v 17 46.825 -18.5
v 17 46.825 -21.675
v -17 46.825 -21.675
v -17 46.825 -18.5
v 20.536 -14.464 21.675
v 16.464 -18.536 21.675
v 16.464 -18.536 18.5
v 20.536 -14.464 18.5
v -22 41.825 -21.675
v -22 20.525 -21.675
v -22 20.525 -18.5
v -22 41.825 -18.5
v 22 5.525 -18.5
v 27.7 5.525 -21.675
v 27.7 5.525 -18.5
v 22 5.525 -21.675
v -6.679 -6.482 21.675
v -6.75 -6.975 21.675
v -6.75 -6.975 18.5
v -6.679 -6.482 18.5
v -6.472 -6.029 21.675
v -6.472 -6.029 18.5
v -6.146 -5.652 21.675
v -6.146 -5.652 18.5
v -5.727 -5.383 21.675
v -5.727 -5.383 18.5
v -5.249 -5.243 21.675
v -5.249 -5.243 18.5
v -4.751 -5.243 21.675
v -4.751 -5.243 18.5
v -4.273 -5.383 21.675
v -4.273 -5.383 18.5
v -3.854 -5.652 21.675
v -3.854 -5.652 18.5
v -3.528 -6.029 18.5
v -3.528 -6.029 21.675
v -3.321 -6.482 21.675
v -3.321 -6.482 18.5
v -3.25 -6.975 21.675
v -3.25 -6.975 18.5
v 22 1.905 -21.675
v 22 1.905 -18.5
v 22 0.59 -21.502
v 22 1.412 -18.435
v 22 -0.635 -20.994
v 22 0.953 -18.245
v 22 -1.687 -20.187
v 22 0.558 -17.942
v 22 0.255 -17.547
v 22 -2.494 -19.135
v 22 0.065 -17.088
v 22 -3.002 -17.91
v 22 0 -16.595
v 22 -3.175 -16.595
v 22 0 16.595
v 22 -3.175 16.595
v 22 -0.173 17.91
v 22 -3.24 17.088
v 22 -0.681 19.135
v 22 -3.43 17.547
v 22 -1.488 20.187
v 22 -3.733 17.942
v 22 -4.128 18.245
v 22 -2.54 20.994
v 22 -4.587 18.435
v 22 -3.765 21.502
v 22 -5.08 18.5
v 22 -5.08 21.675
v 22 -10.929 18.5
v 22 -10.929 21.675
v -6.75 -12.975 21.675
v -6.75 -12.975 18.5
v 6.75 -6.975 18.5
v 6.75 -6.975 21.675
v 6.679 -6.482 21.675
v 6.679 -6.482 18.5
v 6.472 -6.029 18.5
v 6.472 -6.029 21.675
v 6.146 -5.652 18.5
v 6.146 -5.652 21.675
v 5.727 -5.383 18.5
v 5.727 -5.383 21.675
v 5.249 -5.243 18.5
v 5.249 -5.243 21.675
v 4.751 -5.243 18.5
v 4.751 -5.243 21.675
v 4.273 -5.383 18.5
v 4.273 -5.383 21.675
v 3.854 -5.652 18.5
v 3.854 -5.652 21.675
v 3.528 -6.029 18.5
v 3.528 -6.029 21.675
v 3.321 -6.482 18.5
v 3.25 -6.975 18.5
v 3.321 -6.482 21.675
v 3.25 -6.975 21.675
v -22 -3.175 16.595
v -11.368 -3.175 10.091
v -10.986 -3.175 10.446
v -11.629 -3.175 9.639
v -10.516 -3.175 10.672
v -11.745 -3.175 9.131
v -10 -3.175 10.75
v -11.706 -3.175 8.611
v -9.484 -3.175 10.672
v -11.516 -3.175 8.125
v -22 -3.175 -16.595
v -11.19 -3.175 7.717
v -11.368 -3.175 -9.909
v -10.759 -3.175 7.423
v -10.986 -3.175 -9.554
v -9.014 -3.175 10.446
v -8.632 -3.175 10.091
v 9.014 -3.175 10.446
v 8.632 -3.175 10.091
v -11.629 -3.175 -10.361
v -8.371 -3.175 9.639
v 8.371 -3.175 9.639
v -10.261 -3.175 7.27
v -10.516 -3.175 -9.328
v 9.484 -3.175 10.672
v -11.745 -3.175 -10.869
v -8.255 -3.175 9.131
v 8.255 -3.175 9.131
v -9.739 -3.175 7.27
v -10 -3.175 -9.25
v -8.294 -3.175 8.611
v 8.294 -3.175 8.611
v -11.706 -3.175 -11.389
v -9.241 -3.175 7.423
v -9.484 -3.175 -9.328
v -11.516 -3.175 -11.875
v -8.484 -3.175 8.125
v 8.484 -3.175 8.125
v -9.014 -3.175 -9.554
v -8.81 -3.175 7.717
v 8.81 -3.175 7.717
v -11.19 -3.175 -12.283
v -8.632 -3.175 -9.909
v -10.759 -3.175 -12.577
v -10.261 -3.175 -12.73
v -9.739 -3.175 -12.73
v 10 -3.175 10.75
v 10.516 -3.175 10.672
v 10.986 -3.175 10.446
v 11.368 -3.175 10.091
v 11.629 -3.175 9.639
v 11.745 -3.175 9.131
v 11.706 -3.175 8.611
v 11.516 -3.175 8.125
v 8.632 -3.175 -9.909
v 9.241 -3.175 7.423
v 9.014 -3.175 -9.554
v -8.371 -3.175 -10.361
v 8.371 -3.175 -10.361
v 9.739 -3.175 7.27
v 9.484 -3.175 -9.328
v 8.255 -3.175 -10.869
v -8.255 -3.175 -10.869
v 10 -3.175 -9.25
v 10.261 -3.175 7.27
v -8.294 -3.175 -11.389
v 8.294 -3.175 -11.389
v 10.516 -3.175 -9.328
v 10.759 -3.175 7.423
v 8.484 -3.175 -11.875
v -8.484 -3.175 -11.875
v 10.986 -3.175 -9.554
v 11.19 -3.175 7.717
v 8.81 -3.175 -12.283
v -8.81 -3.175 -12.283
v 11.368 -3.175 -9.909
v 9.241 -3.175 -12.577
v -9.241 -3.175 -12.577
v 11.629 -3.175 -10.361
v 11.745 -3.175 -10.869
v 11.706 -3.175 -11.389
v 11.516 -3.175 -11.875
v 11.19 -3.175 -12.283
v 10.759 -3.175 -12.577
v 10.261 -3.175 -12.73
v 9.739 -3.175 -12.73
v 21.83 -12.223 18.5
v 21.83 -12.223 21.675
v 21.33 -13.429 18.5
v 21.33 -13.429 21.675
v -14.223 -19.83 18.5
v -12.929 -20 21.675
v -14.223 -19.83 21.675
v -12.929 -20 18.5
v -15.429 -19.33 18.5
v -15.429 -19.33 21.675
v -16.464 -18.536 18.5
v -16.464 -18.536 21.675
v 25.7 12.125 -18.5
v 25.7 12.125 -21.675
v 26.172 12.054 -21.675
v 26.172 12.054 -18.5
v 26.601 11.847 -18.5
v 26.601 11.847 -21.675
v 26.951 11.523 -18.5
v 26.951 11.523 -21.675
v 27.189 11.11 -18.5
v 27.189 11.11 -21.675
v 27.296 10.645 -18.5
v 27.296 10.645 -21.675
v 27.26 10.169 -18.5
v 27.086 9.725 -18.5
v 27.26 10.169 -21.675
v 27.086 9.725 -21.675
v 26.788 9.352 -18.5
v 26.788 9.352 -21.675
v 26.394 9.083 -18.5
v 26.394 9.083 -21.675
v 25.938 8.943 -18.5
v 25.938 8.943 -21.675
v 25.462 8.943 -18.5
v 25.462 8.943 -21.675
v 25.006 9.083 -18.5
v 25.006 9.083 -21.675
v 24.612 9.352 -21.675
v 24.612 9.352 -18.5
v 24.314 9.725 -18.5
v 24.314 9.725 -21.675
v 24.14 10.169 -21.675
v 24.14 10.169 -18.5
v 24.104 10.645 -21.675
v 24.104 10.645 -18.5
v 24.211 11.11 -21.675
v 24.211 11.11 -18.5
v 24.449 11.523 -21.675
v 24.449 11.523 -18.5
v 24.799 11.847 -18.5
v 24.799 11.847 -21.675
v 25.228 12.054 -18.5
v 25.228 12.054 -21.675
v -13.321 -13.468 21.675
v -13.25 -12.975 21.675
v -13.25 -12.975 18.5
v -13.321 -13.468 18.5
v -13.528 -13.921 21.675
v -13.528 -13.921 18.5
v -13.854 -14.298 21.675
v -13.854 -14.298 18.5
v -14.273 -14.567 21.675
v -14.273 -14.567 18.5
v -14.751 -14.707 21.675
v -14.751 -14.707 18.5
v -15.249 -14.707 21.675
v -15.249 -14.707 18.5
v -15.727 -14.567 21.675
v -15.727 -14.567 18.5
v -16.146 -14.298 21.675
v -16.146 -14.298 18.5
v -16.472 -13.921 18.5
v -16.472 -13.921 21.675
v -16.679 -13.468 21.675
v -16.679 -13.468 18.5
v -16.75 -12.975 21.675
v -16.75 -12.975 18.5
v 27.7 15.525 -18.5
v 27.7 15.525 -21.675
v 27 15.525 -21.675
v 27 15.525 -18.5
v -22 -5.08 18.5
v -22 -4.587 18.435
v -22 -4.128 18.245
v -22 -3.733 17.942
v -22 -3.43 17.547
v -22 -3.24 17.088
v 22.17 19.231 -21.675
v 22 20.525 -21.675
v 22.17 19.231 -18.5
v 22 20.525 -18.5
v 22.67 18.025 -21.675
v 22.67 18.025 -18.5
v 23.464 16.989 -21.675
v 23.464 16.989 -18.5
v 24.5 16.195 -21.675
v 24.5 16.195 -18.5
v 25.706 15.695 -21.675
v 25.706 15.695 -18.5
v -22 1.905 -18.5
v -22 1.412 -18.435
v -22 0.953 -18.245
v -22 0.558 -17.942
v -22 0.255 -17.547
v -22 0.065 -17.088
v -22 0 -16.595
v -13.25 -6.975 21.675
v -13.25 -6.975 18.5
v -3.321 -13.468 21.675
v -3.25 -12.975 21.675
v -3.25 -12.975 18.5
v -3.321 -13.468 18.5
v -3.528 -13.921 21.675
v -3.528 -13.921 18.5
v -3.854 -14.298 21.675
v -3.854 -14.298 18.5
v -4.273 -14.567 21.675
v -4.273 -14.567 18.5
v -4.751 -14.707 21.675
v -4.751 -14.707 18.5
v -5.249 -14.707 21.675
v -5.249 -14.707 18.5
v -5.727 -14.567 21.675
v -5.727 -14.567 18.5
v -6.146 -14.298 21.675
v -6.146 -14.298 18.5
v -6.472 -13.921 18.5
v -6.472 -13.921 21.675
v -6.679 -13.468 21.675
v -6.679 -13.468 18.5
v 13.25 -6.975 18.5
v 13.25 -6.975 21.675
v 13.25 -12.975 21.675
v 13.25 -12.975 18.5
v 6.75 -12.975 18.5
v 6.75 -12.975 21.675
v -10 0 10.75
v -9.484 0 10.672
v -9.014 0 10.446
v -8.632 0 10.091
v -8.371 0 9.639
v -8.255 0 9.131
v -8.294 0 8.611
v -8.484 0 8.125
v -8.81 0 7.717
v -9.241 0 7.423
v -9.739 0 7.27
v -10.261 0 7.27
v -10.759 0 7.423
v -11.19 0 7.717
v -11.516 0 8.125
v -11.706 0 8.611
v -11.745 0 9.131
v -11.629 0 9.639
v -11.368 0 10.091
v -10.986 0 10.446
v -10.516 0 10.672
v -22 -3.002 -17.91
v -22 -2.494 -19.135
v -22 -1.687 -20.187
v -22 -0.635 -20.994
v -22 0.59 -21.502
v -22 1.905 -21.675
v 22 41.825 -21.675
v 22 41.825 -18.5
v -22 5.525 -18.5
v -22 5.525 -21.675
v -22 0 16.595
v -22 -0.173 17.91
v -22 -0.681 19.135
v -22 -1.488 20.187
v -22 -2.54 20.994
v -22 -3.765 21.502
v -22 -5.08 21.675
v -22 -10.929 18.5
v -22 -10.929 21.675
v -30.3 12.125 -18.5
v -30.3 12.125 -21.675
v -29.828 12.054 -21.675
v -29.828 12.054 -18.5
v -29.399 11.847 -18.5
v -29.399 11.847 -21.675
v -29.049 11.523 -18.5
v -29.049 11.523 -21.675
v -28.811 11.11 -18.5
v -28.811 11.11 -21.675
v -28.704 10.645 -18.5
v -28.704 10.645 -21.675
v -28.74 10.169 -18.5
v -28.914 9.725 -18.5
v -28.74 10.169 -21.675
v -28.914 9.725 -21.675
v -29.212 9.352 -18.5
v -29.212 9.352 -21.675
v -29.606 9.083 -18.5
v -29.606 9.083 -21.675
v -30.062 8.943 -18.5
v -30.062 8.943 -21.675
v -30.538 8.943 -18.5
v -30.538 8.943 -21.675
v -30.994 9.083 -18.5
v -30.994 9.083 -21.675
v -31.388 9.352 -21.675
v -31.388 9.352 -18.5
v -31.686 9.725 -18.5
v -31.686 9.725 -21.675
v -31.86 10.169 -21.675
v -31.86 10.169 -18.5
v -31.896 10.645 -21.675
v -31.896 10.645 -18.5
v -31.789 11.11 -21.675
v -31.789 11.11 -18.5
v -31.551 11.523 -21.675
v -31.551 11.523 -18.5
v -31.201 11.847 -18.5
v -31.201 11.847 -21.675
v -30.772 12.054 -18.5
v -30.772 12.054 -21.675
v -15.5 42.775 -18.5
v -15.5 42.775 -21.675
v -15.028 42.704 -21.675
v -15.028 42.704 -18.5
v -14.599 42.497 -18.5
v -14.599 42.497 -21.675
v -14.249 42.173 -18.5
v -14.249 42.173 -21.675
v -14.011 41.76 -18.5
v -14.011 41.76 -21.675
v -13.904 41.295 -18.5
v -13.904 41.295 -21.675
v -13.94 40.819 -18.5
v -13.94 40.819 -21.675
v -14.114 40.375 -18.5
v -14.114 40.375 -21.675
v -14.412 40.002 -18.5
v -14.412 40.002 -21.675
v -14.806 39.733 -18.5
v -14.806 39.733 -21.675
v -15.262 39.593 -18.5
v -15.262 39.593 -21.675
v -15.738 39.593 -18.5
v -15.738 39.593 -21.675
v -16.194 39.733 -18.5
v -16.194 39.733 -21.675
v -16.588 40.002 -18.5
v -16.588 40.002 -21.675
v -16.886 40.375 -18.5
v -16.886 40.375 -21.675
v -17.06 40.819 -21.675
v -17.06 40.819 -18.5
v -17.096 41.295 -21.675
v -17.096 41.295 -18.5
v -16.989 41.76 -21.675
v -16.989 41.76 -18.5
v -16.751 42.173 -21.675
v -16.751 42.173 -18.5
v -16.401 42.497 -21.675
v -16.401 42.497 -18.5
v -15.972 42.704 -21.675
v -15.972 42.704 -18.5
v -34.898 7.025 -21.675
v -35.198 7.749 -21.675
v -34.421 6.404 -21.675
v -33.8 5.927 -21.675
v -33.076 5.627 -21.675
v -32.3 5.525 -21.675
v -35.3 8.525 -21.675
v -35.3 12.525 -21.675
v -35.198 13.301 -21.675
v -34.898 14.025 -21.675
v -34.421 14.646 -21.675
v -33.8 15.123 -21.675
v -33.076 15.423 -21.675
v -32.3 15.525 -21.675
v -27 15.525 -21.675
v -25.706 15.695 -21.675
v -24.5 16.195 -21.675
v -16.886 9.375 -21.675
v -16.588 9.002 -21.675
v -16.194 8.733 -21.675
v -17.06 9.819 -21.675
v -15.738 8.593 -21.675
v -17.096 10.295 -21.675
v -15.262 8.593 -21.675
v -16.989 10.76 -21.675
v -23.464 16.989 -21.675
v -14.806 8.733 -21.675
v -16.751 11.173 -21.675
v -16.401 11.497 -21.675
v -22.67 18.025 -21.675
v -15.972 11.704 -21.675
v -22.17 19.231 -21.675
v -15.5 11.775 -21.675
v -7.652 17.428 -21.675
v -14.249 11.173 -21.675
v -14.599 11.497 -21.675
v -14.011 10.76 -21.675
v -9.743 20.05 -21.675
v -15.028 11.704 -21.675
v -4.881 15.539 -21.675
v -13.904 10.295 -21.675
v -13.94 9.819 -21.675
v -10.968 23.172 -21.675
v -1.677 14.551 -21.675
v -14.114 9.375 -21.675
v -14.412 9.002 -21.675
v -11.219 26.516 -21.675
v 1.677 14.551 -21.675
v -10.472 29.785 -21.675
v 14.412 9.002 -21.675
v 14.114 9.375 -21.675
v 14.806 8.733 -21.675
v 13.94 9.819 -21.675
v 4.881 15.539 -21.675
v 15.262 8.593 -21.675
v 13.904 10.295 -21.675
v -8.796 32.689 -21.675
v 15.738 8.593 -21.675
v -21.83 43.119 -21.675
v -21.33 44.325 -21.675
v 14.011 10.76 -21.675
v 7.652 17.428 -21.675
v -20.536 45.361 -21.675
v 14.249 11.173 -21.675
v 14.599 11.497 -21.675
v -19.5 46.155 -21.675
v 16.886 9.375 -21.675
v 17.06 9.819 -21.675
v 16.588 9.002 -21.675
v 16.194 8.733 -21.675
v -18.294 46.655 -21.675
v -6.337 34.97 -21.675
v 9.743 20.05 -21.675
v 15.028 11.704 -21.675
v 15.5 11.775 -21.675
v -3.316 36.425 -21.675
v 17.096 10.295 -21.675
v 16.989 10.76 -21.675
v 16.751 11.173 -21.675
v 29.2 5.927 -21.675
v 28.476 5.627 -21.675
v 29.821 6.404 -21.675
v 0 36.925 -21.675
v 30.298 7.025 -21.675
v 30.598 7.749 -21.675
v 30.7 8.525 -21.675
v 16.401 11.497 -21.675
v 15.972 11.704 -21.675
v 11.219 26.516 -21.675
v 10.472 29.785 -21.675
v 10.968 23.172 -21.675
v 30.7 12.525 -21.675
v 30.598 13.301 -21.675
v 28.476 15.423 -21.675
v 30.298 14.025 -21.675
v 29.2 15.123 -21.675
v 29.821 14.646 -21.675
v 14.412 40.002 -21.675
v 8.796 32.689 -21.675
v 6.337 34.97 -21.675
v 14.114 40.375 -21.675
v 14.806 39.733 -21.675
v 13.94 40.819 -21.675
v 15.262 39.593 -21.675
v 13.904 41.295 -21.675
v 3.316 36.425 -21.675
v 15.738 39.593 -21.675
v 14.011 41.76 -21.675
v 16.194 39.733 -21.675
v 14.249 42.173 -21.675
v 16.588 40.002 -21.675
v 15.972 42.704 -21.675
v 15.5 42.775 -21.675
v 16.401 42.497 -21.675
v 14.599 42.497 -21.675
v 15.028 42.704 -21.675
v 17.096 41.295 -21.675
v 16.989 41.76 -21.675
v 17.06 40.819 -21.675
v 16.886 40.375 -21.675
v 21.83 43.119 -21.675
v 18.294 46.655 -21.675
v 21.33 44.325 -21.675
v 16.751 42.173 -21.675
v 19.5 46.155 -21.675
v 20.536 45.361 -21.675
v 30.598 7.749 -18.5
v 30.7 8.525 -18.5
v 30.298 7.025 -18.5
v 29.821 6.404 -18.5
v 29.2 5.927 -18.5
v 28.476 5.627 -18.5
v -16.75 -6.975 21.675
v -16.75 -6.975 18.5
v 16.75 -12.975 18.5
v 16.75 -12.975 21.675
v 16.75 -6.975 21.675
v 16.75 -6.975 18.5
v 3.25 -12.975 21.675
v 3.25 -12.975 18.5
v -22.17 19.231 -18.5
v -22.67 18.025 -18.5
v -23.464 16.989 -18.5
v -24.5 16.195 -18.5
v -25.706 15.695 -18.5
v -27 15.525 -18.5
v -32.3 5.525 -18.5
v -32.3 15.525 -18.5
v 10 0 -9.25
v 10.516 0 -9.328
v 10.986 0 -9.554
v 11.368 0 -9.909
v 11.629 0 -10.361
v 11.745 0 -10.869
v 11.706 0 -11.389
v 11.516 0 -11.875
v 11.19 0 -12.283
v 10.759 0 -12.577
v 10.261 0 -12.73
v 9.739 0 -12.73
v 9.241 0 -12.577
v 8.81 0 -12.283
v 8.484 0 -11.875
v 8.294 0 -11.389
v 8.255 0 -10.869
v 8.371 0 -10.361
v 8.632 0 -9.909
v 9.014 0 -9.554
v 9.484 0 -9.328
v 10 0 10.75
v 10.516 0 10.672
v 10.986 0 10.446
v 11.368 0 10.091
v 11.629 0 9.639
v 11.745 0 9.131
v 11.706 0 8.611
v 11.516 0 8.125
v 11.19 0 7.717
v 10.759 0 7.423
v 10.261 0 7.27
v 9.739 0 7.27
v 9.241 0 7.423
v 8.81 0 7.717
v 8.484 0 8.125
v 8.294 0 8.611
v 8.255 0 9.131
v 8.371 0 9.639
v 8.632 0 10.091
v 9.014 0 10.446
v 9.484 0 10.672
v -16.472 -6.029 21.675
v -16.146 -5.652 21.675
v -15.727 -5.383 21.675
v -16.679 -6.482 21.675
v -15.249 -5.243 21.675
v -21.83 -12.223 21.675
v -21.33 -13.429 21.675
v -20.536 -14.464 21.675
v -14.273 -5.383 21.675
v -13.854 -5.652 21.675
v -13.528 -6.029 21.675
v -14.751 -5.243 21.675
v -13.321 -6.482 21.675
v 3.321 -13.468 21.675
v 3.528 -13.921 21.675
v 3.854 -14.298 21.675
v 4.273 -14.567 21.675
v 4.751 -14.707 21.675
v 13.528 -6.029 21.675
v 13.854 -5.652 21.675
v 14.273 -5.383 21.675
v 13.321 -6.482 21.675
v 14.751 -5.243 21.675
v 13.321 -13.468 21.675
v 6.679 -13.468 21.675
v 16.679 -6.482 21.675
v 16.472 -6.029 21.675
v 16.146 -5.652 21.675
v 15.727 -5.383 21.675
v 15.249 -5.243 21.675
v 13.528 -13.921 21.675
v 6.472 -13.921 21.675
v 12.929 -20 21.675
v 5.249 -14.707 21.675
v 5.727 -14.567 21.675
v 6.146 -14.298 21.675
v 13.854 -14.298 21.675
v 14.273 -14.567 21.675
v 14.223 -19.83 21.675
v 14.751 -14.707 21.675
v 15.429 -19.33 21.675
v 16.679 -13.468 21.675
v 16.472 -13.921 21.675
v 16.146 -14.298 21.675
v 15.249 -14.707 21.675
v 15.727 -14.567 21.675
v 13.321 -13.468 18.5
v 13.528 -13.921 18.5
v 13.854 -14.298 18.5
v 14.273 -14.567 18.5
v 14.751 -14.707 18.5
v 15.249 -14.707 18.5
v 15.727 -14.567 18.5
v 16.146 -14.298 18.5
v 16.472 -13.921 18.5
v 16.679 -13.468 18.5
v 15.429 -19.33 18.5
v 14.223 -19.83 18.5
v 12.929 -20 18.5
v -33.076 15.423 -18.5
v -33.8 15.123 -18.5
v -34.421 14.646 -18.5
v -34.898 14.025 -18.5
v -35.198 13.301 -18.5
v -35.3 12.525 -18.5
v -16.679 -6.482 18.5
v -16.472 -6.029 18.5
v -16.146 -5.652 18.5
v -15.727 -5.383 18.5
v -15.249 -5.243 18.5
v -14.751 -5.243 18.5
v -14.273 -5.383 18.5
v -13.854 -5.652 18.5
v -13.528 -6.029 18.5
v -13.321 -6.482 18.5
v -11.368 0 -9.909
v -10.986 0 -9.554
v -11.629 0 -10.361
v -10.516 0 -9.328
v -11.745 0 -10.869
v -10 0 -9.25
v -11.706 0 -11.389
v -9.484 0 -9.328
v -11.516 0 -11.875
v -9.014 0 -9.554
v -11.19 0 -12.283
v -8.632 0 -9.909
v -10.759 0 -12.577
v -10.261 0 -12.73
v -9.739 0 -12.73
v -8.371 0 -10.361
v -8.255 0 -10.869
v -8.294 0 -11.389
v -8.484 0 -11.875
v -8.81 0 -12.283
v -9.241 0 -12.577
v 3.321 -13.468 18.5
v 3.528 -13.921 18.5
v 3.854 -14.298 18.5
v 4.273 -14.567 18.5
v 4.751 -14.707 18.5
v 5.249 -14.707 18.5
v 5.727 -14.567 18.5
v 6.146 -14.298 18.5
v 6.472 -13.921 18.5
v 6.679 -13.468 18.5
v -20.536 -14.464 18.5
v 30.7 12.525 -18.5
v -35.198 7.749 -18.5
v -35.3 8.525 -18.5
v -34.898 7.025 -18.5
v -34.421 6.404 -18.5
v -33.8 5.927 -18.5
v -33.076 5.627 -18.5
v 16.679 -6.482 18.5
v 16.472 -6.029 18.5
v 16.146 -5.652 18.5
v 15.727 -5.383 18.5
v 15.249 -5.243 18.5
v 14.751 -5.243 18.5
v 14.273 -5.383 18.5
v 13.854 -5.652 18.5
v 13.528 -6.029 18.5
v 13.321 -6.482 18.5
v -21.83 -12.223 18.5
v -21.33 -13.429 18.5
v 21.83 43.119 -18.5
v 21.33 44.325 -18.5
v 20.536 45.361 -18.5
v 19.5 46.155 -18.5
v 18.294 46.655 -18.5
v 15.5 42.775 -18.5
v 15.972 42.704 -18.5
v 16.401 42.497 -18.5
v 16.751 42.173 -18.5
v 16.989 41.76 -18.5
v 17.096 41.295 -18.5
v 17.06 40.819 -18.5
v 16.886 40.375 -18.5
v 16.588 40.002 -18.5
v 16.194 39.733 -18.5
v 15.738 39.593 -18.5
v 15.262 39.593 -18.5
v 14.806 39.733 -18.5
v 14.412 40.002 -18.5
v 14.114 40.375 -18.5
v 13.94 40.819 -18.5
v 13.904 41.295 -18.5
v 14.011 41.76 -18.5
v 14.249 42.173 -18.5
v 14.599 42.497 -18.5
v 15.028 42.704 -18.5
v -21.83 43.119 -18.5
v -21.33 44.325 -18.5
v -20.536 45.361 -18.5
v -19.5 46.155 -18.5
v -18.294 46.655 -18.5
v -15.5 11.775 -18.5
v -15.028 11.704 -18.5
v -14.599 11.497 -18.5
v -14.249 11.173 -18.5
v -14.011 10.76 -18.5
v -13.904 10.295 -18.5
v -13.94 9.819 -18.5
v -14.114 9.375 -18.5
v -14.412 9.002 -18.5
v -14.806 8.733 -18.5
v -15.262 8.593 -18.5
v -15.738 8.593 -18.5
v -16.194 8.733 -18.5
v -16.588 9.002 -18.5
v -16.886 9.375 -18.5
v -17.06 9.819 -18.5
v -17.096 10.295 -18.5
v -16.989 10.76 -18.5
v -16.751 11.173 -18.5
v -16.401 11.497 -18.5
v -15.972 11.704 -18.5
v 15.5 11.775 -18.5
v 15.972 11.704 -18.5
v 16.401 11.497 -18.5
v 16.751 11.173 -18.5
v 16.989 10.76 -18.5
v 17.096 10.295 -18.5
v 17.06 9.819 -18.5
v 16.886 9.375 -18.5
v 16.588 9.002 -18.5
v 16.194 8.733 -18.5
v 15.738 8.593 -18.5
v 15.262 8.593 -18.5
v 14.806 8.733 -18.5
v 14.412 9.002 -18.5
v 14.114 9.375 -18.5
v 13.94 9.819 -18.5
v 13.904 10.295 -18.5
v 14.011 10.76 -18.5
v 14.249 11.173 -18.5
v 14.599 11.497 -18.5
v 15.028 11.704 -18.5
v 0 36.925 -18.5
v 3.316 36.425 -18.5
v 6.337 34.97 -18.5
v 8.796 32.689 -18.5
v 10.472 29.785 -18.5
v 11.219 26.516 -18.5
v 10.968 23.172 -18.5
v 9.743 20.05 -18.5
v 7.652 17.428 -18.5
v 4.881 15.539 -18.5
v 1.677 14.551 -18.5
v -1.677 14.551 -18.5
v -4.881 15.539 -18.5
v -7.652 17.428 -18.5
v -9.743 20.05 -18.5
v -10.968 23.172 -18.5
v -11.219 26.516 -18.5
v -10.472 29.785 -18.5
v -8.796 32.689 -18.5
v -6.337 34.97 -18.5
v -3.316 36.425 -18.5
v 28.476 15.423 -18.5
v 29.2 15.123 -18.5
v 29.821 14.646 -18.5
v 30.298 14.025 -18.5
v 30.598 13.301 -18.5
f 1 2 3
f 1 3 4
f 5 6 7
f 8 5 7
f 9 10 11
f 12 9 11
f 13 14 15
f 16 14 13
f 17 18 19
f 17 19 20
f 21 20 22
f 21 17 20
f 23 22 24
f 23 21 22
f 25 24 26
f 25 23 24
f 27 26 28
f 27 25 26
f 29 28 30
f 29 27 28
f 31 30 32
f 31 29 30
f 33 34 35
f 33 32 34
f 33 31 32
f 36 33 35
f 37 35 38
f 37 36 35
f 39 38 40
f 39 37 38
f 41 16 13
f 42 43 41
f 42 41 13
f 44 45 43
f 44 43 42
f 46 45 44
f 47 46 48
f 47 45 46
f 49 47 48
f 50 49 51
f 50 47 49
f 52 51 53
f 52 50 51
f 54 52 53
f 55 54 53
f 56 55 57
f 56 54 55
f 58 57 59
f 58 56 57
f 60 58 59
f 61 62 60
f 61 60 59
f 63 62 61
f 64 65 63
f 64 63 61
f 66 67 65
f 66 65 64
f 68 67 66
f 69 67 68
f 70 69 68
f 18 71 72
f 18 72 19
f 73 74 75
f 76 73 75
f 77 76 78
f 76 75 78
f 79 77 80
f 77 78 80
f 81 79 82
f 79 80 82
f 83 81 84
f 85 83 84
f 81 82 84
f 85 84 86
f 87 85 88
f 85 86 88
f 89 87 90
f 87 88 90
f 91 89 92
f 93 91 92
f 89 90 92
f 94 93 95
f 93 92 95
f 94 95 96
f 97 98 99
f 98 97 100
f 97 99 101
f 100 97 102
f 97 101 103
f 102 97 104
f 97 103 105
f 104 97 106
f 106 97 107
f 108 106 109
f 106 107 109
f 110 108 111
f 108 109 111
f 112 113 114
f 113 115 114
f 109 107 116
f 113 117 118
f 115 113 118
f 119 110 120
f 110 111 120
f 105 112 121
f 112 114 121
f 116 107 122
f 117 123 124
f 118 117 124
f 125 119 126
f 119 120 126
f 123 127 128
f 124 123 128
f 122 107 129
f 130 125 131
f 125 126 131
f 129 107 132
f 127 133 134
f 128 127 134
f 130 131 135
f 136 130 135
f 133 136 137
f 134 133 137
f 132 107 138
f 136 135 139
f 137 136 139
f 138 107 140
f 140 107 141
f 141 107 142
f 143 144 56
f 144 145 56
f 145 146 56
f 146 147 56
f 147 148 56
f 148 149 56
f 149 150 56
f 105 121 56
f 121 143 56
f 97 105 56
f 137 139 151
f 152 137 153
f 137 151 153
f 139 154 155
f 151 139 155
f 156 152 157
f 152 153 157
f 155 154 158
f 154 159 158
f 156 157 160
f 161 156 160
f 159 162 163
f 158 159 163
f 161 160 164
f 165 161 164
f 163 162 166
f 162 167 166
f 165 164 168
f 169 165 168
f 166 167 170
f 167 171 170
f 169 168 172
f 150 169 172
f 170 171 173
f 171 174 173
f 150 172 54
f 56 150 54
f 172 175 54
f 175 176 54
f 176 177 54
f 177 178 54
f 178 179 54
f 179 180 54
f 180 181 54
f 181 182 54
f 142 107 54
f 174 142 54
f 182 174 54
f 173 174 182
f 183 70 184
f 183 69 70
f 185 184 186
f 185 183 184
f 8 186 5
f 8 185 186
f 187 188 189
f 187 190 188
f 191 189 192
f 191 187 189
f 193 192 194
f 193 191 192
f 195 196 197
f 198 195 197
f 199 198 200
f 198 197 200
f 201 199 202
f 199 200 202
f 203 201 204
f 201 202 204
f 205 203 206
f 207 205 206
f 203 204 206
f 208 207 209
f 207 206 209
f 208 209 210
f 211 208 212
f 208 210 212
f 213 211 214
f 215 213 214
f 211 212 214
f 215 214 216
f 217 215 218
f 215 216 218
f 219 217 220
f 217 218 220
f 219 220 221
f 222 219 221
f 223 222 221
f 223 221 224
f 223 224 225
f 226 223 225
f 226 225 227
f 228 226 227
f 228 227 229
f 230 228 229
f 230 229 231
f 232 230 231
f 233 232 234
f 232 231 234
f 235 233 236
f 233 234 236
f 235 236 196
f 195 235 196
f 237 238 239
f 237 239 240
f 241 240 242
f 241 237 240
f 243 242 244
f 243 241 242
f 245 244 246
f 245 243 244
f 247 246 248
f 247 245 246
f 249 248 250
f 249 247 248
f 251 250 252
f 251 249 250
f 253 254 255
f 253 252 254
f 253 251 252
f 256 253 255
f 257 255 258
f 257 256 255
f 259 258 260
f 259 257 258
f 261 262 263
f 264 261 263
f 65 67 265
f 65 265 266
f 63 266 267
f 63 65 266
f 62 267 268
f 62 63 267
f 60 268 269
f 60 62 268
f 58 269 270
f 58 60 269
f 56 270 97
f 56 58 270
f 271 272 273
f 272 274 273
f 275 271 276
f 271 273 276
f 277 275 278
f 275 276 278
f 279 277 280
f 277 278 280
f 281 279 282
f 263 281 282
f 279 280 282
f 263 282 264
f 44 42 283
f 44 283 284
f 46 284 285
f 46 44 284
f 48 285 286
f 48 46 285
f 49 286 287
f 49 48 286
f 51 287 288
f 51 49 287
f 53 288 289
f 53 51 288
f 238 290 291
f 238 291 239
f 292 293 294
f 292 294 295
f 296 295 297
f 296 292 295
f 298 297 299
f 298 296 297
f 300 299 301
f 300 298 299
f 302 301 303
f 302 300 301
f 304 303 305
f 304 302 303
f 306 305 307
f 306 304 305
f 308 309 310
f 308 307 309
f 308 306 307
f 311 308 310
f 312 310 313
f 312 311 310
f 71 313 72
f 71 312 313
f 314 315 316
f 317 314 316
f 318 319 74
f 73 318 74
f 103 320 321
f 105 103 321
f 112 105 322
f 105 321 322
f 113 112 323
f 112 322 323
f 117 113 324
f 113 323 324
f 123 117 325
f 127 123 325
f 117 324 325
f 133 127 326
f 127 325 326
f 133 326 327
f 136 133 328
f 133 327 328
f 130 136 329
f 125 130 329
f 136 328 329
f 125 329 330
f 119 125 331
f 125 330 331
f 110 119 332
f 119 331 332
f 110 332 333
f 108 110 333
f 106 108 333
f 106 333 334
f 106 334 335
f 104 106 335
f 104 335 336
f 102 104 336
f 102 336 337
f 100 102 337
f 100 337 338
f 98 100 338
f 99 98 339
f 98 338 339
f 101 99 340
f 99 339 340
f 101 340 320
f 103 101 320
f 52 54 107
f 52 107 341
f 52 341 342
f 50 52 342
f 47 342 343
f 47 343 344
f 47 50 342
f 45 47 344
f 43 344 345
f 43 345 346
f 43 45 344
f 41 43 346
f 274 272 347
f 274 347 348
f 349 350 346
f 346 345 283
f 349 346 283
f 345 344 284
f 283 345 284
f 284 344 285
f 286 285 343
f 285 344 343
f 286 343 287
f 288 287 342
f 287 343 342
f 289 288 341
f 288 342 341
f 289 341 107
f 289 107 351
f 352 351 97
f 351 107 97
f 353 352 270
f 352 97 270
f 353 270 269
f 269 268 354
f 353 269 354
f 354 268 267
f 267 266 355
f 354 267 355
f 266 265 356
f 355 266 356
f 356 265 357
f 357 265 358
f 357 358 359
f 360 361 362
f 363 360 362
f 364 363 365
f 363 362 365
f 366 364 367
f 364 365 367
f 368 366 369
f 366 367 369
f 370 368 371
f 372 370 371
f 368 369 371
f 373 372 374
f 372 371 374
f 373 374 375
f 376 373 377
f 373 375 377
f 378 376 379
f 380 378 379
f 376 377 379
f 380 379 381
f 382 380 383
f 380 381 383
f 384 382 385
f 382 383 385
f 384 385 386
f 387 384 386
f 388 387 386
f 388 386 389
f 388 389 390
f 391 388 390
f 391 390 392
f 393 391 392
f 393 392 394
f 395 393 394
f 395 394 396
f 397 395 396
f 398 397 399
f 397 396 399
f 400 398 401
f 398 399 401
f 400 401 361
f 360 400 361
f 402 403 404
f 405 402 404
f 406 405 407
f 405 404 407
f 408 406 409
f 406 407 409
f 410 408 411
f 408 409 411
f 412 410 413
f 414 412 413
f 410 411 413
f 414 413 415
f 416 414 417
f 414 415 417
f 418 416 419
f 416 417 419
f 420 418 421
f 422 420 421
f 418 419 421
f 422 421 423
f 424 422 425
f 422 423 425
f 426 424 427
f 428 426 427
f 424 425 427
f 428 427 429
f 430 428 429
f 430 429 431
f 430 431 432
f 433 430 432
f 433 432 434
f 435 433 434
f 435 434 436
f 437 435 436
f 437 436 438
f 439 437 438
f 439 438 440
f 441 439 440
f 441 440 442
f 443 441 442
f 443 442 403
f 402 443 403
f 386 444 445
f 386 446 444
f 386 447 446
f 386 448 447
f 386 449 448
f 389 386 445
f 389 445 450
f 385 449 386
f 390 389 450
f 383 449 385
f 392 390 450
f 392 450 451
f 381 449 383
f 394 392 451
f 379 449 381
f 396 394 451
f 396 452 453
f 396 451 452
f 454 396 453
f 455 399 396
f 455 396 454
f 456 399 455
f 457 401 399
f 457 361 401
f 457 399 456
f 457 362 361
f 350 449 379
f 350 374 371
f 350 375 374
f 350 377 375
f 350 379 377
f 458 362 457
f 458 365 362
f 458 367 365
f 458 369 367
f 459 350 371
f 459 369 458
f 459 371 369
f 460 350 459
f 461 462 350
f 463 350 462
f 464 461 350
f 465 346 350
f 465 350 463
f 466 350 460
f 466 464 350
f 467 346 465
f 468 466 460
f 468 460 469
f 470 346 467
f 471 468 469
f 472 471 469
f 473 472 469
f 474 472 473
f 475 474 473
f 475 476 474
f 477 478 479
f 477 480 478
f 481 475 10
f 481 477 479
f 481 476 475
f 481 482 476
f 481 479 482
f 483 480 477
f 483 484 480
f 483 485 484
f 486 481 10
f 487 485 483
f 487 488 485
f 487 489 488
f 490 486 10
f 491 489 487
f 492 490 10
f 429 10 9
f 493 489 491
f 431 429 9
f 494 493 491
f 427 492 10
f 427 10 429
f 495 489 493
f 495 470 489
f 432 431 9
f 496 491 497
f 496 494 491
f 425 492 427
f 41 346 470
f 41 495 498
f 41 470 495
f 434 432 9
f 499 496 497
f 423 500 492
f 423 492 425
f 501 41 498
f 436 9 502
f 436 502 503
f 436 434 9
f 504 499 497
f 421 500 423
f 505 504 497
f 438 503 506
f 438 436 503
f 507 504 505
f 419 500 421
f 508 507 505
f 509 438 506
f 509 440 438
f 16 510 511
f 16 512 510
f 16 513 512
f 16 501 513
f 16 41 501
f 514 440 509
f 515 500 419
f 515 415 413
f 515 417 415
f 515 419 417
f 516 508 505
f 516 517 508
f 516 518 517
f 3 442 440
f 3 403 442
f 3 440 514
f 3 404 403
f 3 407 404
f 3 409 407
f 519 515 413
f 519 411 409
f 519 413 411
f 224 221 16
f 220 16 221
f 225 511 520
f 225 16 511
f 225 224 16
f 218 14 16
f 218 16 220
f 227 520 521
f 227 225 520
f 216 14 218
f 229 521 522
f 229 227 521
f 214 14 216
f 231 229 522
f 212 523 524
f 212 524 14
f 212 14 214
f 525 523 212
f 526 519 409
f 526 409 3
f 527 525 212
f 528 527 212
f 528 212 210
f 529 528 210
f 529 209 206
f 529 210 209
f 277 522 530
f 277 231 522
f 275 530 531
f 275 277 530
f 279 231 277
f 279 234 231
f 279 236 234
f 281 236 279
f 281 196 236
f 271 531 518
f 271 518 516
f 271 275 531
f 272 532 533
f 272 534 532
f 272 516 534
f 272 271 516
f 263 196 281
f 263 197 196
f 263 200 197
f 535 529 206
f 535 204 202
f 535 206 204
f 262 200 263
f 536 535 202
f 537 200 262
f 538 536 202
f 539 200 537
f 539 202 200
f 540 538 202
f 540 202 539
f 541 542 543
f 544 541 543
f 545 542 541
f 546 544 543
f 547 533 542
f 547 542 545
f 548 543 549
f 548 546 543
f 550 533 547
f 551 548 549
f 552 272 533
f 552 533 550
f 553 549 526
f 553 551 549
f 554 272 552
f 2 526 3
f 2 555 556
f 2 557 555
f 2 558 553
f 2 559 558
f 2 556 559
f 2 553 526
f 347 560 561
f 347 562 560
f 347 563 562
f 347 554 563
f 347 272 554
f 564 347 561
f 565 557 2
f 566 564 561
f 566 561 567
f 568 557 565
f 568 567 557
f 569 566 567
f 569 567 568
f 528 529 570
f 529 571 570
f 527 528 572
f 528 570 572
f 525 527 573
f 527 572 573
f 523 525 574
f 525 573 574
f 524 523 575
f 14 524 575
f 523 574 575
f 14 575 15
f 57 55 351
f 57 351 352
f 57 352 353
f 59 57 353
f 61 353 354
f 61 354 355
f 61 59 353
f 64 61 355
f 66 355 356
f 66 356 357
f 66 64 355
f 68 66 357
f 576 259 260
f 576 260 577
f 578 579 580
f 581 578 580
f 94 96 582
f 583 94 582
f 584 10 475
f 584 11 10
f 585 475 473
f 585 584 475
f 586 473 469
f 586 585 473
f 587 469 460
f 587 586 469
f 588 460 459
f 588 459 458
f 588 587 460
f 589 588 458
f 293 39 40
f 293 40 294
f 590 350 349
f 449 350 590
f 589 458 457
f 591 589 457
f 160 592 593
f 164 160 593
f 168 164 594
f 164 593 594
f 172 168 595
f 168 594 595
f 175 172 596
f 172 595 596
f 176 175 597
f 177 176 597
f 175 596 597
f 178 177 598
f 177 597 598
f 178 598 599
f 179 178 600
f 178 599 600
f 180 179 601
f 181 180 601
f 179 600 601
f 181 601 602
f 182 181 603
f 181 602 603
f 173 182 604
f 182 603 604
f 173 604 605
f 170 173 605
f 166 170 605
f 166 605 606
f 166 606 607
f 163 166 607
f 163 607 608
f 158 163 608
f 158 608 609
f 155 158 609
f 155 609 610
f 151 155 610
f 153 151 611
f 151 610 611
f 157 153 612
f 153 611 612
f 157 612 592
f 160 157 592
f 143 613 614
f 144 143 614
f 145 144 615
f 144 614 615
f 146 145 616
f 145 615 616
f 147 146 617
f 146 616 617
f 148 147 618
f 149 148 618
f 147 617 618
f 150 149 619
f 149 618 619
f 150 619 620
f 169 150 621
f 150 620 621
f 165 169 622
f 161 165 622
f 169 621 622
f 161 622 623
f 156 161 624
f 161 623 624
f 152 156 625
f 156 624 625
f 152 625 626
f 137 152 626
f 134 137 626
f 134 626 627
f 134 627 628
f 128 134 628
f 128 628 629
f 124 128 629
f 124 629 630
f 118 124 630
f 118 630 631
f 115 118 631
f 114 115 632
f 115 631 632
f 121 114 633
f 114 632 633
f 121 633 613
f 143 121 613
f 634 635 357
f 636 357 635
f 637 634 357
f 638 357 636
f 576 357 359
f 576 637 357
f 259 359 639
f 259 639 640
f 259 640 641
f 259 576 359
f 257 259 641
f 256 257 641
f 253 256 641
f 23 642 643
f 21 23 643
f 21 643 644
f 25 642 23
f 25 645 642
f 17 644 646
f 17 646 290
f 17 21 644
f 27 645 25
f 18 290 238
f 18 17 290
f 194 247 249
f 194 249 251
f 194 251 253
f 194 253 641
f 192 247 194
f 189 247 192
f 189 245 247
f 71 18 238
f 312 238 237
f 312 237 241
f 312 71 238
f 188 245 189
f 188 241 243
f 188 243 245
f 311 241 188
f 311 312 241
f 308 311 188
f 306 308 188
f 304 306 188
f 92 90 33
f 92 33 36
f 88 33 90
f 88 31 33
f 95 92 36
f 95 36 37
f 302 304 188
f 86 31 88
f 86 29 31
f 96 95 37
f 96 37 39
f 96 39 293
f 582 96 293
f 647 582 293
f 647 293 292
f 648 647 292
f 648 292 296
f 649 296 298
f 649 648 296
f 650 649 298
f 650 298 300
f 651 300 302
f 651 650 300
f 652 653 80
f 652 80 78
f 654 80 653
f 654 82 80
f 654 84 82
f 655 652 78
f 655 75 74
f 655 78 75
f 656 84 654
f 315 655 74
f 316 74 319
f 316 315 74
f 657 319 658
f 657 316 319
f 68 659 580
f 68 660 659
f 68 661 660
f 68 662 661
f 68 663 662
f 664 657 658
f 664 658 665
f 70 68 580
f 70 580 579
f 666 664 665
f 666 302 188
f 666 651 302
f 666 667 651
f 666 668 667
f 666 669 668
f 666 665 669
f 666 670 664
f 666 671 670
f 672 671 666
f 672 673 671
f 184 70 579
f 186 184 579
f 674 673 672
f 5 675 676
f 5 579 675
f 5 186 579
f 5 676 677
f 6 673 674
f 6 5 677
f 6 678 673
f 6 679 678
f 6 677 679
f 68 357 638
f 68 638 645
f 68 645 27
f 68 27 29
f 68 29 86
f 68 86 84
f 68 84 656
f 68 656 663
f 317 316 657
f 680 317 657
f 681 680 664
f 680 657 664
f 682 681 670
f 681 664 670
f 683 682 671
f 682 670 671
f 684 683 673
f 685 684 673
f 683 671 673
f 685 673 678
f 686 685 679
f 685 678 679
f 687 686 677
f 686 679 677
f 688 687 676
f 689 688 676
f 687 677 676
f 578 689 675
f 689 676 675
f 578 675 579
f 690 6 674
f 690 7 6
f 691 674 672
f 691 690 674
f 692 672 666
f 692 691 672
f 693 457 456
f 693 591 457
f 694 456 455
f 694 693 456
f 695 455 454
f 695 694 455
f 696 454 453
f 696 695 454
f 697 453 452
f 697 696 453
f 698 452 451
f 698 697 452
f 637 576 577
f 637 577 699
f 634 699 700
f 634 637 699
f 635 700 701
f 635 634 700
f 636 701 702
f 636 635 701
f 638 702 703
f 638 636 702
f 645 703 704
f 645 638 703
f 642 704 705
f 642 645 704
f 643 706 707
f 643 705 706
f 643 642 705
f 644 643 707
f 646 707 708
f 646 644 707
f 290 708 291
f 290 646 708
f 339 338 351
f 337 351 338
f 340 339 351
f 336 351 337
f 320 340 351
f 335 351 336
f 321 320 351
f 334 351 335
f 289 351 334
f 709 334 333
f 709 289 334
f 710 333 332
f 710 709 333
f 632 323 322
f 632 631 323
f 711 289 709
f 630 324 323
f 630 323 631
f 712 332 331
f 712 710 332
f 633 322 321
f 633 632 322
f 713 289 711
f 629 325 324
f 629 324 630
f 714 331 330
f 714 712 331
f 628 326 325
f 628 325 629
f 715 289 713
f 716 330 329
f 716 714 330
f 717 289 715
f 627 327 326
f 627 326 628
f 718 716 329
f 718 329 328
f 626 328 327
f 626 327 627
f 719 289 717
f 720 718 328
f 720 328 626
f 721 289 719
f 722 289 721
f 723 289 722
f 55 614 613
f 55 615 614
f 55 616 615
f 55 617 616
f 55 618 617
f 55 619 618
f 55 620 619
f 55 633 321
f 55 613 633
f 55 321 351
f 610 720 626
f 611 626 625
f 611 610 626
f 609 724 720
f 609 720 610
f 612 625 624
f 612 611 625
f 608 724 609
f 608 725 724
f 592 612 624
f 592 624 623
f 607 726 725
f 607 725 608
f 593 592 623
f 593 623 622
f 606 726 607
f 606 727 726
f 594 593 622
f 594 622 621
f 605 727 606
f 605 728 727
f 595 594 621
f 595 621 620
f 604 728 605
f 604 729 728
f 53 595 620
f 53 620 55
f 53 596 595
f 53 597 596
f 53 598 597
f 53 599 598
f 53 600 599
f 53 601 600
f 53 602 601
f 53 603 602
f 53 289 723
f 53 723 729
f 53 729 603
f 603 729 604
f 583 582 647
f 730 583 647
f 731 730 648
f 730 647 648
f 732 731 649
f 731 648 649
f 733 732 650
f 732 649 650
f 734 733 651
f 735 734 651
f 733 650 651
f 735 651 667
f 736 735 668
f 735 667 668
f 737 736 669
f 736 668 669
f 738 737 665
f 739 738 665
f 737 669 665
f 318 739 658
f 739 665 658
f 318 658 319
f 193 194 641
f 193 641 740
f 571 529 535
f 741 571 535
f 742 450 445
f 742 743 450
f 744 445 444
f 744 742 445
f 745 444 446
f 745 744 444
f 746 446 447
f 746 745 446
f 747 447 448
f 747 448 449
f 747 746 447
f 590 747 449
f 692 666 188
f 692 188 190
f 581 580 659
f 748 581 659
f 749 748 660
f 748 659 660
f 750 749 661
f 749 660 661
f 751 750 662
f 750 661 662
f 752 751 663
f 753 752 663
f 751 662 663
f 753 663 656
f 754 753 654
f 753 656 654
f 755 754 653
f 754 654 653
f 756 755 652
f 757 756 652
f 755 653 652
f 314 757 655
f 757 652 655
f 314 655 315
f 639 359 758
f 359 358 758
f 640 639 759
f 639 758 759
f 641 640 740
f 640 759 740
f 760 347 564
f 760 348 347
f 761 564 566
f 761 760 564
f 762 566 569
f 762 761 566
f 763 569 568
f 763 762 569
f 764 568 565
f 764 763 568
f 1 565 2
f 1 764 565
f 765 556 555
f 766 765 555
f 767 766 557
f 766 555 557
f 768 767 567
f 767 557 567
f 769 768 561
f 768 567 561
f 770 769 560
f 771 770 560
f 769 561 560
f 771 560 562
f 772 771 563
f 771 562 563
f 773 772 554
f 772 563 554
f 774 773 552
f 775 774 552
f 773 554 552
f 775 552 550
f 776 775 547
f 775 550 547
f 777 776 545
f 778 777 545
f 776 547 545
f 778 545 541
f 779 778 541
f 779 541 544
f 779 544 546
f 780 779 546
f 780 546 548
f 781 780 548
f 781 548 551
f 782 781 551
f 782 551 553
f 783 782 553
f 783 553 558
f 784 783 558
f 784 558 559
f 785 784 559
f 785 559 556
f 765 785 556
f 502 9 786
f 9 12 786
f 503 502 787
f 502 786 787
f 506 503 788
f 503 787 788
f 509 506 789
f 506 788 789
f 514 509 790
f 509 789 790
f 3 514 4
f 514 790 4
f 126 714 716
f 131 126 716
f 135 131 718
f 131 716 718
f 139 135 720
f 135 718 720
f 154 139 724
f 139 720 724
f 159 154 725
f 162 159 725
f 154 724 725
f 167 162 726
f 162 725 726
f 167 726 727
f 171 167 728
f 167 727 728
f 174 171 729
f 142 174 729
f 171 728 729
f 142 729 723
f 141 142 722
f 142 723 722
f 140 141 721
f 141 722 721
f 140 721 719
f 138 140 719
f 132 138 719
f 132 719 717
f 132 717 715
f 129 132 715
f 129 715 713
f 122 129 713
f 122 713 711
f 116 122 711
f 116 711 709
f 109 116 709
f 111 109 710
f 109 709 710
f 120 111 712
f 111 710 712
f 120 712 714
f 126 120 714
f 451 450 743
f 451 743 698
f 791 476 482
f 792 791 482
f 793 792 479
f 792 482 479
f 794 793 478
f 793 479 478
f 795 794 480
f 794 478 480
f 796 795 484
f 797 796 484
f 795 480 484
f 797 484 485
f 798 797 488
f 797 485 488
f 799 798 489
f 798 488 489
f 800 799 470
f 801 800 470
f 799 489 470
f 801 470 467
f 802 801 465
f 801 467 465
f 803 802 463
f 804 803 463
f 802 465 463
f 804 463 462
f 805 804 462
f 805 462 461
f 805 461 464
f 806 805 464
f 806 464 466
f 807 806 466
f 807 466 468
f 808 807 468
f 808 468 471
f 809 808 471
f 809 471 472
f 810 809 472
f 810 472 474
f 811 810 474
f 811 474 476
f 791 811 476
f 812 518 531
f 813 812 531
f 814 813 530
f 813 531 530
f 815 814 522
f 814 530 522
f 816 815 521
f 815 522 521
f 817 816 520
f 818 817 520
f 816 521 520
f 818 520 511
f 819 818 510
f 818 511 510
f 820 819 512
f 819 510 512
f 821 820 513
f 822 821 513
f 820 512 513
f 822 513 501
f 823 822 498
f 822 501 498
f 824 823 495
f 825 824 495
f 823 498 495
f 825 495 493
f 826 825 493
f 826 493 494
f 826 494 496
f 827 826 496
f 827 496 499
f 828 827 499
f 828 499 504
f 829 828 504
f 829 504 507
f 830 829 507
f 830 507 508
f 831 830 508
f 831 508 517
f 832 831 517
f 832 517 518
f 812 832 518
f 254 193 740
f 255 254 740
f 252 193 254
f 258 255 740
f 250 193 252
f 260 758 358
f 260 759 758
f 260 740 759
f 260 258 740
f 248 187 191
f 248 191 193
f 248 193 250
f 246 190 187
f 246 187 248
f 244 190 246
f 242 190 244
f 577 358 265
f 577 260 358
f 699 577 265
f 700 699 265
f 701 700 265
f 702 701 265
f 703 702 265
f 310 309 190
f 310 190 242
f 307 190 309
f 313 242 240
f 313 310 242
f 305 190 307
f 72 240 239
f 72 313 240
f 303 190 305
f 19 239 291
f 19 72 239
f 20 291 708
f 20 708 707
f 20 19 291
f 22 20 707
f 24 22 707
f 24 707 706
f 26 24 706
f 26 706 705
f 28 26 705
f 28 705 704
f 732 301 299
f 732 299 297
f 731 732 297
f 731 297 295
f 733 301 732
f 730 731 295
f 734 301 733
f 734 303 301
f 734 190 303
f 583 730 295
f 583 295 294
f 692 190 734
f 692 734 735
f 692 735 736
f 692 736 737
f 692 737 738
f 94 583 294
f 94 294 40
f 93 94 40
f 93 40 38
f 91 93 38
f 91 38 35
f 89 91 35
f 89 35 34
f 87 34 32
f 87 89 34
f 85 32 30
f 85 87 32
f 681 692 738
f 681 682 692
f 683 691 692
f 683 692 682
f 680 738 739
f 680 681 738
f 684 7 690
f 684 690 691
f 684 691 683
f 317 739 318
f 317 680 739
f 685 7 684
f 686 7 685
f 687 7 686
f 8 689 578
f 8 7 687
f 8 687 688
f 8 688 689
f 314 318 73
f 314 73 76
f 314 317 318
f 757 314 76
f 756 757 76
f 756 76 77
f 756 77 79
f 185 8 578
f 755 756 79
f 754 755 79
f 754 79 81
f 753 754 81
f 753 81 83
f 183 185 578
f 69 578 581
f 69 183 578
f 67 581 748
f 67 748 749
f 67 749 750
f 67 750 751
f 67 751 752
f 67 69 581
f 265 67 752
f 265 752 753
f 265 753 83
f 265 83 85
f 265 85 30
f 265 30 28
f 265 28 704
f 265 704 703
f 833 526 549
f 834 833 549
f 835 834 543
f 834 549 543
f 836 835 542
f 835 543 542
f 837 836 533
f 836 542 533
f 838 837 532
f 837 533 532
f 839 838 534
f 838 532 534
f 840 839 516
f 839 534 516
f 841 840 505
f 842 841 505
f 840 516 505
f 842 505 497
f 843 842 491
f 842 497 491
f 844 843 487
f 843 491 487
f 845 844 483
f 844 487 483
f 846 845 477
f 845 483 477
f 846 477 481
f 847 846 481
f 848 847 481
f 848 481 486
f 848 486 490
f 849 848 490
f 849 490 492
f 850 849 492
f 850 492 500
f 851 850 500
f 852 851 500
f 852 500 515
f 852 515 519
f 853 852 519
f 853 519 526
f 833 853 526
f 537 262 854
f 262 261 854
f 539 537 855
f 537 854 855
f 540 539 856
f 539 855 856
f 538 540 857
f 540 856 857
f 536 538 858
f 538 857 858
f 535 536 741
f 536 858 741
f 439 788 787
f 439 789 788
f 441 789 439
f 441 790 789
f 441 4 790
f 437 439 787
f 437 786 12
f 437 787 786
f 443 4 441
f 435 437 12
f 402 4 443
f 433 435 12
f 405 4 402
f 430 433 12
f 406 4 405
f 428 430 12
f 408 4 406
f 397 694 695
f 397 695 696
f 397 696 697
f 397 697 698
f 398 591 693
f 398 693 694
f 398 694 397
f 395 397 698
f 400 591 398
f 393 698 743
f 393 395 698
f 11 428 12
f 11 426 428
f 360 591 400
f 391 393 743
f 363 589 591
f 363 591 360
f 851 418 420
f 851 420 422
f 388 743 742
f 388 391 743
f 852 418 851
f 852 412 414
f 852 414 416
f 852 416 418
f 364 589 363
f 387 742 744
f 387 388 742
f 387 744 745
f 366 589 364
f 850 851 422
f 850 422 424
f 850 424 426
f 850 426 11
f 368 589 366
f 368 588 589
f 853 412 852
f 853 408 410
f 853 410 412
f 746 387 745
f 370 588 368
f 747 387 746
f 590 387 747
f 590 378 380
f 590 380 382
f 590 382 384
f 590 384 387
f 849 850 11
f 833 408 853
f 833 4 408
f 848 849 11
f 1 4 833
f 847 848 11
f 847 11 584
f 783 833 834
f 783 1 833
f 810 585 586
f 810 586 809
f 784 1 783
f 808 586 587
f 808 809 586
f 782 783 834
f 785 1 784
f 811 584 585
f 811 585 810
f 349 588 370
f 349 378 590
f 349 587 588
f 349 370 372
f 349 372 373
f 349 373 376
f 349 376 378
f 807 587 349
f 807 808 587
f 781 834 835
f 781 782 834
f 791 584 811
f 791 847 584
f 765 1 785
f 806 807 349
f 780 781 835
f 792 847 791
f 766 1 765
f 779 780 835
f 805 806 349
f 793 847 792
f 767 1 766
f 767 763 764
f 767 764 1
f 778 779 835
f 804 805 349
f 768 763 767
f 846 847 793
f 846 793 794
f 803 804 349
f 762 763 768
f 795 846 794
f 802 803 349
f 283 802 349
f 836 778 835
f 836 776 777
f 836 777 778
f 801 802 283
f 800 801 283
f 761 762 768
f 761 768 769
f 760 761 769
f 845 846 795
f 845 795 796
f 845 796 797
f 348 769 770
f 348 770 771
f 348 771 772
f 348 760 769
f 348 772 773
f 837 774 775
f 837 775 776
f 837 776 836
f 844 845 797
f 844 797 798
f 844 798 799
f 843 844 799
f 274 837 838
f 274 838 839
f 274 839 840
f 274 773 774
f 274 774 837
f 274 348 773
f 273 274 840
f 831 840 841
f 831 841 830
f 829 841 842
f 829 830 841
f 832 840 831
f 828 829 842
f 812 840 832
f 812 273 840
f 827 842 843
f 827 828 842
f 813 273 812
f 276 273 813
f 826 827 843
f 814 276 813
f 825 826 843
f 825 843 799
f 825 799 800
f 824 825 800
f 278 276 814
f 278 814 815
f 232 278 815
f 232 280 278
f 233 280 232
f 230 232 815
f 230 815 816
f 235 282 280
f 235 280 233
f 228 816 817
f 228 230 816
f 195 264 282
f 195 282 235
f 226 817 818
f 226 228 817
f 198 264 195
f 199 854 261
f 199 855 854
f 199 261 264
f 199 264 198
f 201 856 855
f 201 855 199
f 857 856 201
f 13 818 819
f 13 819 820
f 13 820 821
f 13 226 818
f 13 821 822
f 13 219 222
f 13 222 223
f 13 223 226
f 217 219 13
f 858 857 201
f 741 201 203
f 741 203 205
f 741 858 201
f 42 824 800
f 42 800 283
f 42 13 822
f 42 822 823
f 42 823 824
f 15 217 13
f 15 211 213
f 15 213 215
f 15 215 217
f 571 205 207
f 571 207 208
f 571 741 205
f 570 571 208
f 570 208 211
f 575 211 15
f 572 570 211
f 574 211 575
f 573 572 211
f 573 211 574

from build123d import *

# Parameters (mm, degrees)
SKETCH1_W                    = 44
SKETCH1_H                    = 37
SKETCH1_R                    = 1.75
BASE_FLANGE1_DEPTH           = 3.175
EDGE_FLANGE1_STRIP_W         = 16.51
EDGE_FLANGE1_STRIP_H         = 3.175
EDGE_FLANGE1_STRIP_CUT_DEPTH = 44
EDGE_FLANGE1_DEPTH           = 44
EDGE_FLANGE2_STRIP_W         = 16.51
EDGE_FLANGE2_STRIP_H         = 3.175
EDGE_FLANGE2_STRIP_CUT_DEPTH = 44
EDGE_FLANGE2_DEPTH           = 44
CUT_EXTRUDE1_REACH           = 69.497
SKETCH12_R                   = 11.25
SKETCH12_R_2                 = 1.6
CUT_EXTRUDE2_REACH           = 69.497
CHAMFER1_SIZE                = 7
FILLET1_R                    = 5
SKETCH14_W                   = 8.7
SKETCH14_H                   = 10
SKETCH14_R                   = 1.6
SKETCH14_W_2                 = 13.3
BOSS_EXTRUDE1_DEPTH          = 3.175
FILLET2_R                    = 5
FILLET3_R                    = 3


# Sheet-metal steps are written as plain solids
with BuildPart() as part:
    # Sketch1 → Base-Flange1 (new body)
    with BuildSketch(Plane(origin=(0, 0, 0), x_dir=(1, 0, 0), z_dir=(0, 1, 0))):
        Rectangle(SKETCH1_W, SKETCH1_H)
        with Locations(Location((-10, 11, 0), (0, 0, 270))):
            Circle(SKETCH1_R, mode=Mode.SUBTRACT)
        with Locations(Location((10, 11, 0), (0, 0, 270))):
            Circle(SKETCH1_R, mode=Mode.SUBTRACT)
        with Locations(Location((10, -9, 0), (0, 0, 270))):
            Circle(SKETCH1_R, mode=Mode.SUBTRACT)
        with Locations(Location((-10, -9, 0), (0, 0, 270))):
            Circle(SKETCH1_R, mode=Mode.SUBTRACT)
    extrude(amount=-BASE_FLANGE1_DEPTH)

    # Edge-Flange1 strip (across the edge) → Edge-Flange1 strip cut (cut)
    with BuildSketch(Plane(origin=(22, 0, -18.5), x_dir=(0, 0, 1), z_dir=(-1, 0, 0))):
        with Locations((-6.35, -1.5875)):
            Rectangle(EDGE_FLANGE1_STRIP_W, EDGE_FLANGE1_STRIP_H)
    extrude(amount=EDGE_FLANGE1_STRIP_CUT_DEPTH, mode=Mode.SUBTRACT)

    # Edge-Flange1 section (across the edge) → Edge-Flange1 (add)
    with BuildSketch(Plane(origin=(22, 0, -18.5), x_dir=(0, 0, 1), z_dir=(-1, 0, 0))):
        with BuildLine():
            Line((-3.175, 1.905), (-3.175, 46.825))
            Line((-3.175, 46.825), (0, 46.825))
            Line((0, 46.825), (0, 1.905))
            ThreePointArc((0, 1.905), (0.557961582, 0.557961582), (1.905, 0))
            Line((1.905, 0), (1.905, -3.175))
            ThreePointArc((1.905, -3.175), (-1.687102448, -1.687102448), (-3.175, 1.905))
        make_face()
    extrude(amount=EDGE_FLANGE1_DEPTH)

    # Edge-Flange2 strip (across the edge) → Edge-Flange2 strip cut (cut)
    with BuildSketch(Plane(origin=(22, -3.175, 18.5), x_dir=(0, 0, -1), z_dir=(-1, 0, 0))):
        with Locations((-6.35, -1.5875)):
            Rectangle(EDGE_FLANGE2_STRIP_W, EDGE_FLANGE2_STRIP_H)
    extrude(amount=EDGE_FLANGE2_STRIP_CUT_DEPTH, mode=Mode.SUBTRACT)

    # Edge-Flange2 section (across the edge) → Edge-Flange2 (add)
    with BuildSketch(Plane(origin=(22, -3.175, 18.5), x_dir=(0, 0, -1), z_dir=(-1, 0, 0))):
        with BuildLine():
            Line((-3.175, 1.905), (-3.175, 16.825))
            Line((-3.175, 16.825), (0, 16.825))
            Line((0, 16.825), (0, 1.905))
            ThreePointArc((0, 1.905), (0.557961582, 0.557961582), (1.905, 0))
            Line((1.905, 0), (1.905, -3.175))
            ThreePointArc((1.905, -3.175), (-1.687102448, -1.687102448), (-3.175, 1.905))
        make_face()
    extrude(amount=EDGE_FLANGE2_DEPTH)

    # Sketch12 → Cut-Extrude1 (cut, up to next)
    with BuildSketch(Plane(origin=(0, 0, -21.675), x_dir=(-1, 0, 0), z_dir=(0, 0, -1)), mode=Mode.PRIVATE) as cut_extrude1_sk1:
        with Locations(Location((0, 25.675, 0), (0, 0, 90))):
            Circle(SKETCH12_R)
    cut_extrude1_tool1 = extrude(cut_extrude1_sk1.sketch, amount=-CUT_EXTRUDE1_REACH, mode=Mode.PRIVATE) & part.part
    # Sketch12 → Cut-Extrude1 (cut, up to next)
    with BuildSketch(Plane(origin=(0, 0, -21.675), x_dir=(-1, 0, 0), z_dir=(0, 0, -1)), mode=Mode.PRIVATE) as cut_extrude1_sk2:
        with Locations(Location((15.5, 41.175, 0), (0, 0, 90))):
            Circle(SKETCH12_R_2)
    cut_extrude1_tool2 = extrude(cut_extrude1_sk2.sketch, amount=-CUT_EXTRUDE1_REACH, mode=Mode.PRIVATE) & part.part
    # Sketch12 → Cut-Extrude1 (cut, up to next)
    with BuildSketch(Plane(origin=(0, 0, -21.675), x_dir=(-1, 0, 0), z_dir=(0, 0, -1)), mode=Mode.PRIVATE) as cut_extrude1_sk3:
        with Locations(Location((15.5, 10.175, 0), (0, 0, 90))):
            Circle(SKETCH12_R_2)
    cut_extrude1_tool3 = extrude(cut_extrude1_sk3.sketch, amount=-CUT_EXTRUDE1_REACH, mode=Mode.PRIVATE) & part.part
    # Sketch12 → Cut-Extrude1 (cut, up to next)
    with BuildSketch(Plane(origin=(0, 0, -21.675), x_dir=(-1, 0, 0), z_dir=(0, 0, -1)), mode=Mode.PRIVATE) as cut_extrude1_sk4:
        with Locations(Location((-15.5, 10.175, 0), (0, 0, 90))):
            Circle(SKETCH12_R_2)
    cut_extrude1_tool4 = extrude(cut_extrude1_sk4.sketch, amount=-CUT_EXTRUDE1_REACH, mode=Mode.PRIVATE) & part.part
    # Sketch12 → Cut-Extrude1 (cut, up to next)
    with BuildSketch(Plane(origin=(0, 0, -21.675), x_dir=(-1, 0, 0), z_dir=(0, 0, -1)), mode=Mode.PRIVATE) as cut_extrude1_sk5:
        with Locations(Location((-15.5, 41.175, 0), (0, 0, 90))):
            Circle(SKETCH12_R_2)
    cut_extrude1_tool5 = extrude(cut_extrude1_sk5.sketch, amount=-CUT_EXTRUDE1_REACH, mode=Mode.PRIVATE) & part.part
    add(cut_extrude1_tool1.solids().sort_by_distance((0, 25.675, -21.675))[0], mode=Mode.SUBTRACT)
    add(cut_extrude1_tool2.solids().sort_by_distance((-15.5, 41.175, -21.675))[0], mode=Mode.SUBTRACT)
    add(cut_extrude1_tool3.solids().sort_by_distance((-15.5, 10.175, -21.675))[0], mode=Mode.SUBTRACT)
    add(cut_extrude1_tool4.solids().sort_by_distance((15.5, 10.175, -21.675))[0], mode=Mode.SUBTRACT)
    add(cut_extrude1_tool5.solids().sort_by_distance((15.5, 41.175, -21.675))[0], mode=Mode.SUBTRACT)

    # Sketch13 → Cut-Extrude2 (cut, up to next)
    with BuildSketch(Plane.XY.offset(21.675), mode=Mode.PRIVATE) as cut_extrude2_sk1:
        with BuildLine():
            Line((-6.75, -12.975), (-6.75, -6.975))
            ThreePointArc((-6.75, -6.975), (-5, -5.225), (-3.25, -6.975))
            Line((-3.25, -6.975), (-3.25, -12.975))
            ThreePointArc((-3.25, -12.975), (-5, -14.725), (-6.75, -12.975))
        make_face()
    cut_extrude2_tool1 = extrude(cut_extrude2_sk1.sketch, amount=-CUT_EXTRUDE2_REACH, mode=Mode.PRIVATE) & part.part
    # Sketch13 → Cut-Extrude2 (cut, up to next)
    with BuildSketch(Plane.XY.offset(21.675), mode=Mode.PRIVATE) as cut_extrude2_sk2:
        with BuildLine():
            Line((-16.75, -12.975), (-16.75, -6.975))
            ThreePointArc((-16.75, -6.975), (-15, -5.225), (-13.25, -6.975))
            Line((-13.25, -6.975), (-13.25, -12.975))
            ThreePointArc((-13.25, -12.975), (-15, -14.725), (-16.75, -12.975))
        make_face()
    cut_extrude2_tool2 = extrude(cut_extrude2_sk2.sketch, amount=-CUT_EXTRUDE2_REACH, mode=Mode.PRIVATE) & part.part
    # Sketch13 → Cut-Extrude2 (cut, up to next)
    with BuildSketch(Plane.XY.offset(21.675), mode=Mode.PRIVATE) as cut_extrude2_sk3:
        with BuildLine():
            Line((16.75, -12.975), (16.75, -6.975))
            ThreePointArc((16.75, -6.975), (15, -5.225), (13.25, -6.975))
            Line((13.25, -6.975), (13.25, -12.975))
            ThreePointArc((13.25, -12.975), (15, -14.725), (16.75, -12.975))
        make_face()
    cut_extrude2_tool3 = extrude(cut_extrude2_sk3.sketch, amount=-CUT_EXTRUDE2_REACH, mode=Mode.PRIVATE) & part.part
    # Sketch13 → Cut-Extrude2 (cut, up to next)
    with BuildSketch(Plane.XY.offset(21.675), mode=Mode.PRIVATE) as cut_extrude2_sk4:
        with BuildLine():
            Line((6.75, -12.975), (6.75, -6.975))
            ThreePointArc((6.75, -6.975), (5, -5.225), (3.25, -6.975))
            Line((3.25, -6.975), (3.25, -12.975))
            ThreePointArc((3.25, -12.975), (5, -14.725), (6.75, -12.975))
        make_face()
    cut_extrude2_tool4 = extrude(cut_extrude2_sk4.sketch, amount=-CUT_EXTRUDE2_REACH, mode=Mode.PRIVATE) & part.part
    add(cut_extrude2_tool1.solids().sort_by_distance((-5, -9.975, 21.675))[0], mode=Mode.SUBTRACT)
    add(cut_extrude2_tool2.solids().sort_by_distance((-15, -9.975, 21.675))[0], mode=Mode.SUBTRACT)
    add(cut_extrude2_tool3.solids().sort_by_distance((15, -9.975, 21.675))[0], mode=Mode.SUBTRACT)
    add(cut_extrude2_tool4.solids().sort_by_distance((5, -9.975, 21.675))[0], mode=Mode.SUBTRACT)

    # Chamfer1
    chamfer1_edges = [part.edges().sort_by_distance(p)[0] for p in [
        (22, -20, 20.0875),
        (-22, -20, 20.0875),
    ]]
    chamfer(chamfer1_edges, length=CHAMFER1_SIZE)

    # Fillet1
    fillet1_edges = [part.edges().sort_by_distance(p)[0] for p in [
        (15, -20, 20.0875),
        (-15, -20, 20.0875),
        (-22, -13, 20.0875),
        (22, -13, 20.0875),
        (22, 46.825, -20.0875),
        (-22, 46.825, -20.0875),
    ]]
    fillet(fillet1_edges, radius=FILLET1_R)

    # Sketch14 → Boss-Extrude1 (add)
    # profile 1 of 2: a face of its own
    with BuildSketch(Plane(origin=(0, 0, -21.675), x_dir=(-1, 0, 0), z_dir=(0, 0, -1))):
        with Locations((-26.35, 10.525)):
            Rectangle(SKETCH14_W, SKETCH14_H)
        with Locations(Location((-25.7, 10.525, 0), (0, 0, 90))):
            Circle(SKETCH14_R, mode=Mode.SUBTRACT)
    # profile 2 of 2: a face of its own
    with BuildSketch(Plane(origin=(0, 0, -21.675), x_dir=(-1, 0, 0), z_dir=(0, 0, -1))):
        with Locations((28.65, 10.525)):
            Rectangle(SKETCH14_W_2, SKETCH14_H)
        with Locations(Location((30.3, 10.525, 0), (0, 0, 90))):
            Circle(SKETCH14_R, mode=Mode.SUBTRACT)
    extrude(amount=-BOSS_EXTRUDE1_DEPTH)

    # Fillet2
    fillet2_edges = [part.edges().sort_by_distance(p)[0] for p in [
        (-22, 15.525, -20.0875),
        (22, 15.525, -20.0875),
    ]]
    fillet(fillet2_edges, radius=FILLET2_R)

    # Fillet3
    fillet3_edges = [part.edges().sort_by_distance(p)[0] for p in [
        (-35.3, 15.525, -20.0875),
        (-35.3, 5.525, -20.0875),
        (30.7, 5.525, -20.0875),
        (30.7, 15.525, -20.0875),
    ]]
    fillet(fillet3_edges, radius=FILLET3_R)


solid = part.part
